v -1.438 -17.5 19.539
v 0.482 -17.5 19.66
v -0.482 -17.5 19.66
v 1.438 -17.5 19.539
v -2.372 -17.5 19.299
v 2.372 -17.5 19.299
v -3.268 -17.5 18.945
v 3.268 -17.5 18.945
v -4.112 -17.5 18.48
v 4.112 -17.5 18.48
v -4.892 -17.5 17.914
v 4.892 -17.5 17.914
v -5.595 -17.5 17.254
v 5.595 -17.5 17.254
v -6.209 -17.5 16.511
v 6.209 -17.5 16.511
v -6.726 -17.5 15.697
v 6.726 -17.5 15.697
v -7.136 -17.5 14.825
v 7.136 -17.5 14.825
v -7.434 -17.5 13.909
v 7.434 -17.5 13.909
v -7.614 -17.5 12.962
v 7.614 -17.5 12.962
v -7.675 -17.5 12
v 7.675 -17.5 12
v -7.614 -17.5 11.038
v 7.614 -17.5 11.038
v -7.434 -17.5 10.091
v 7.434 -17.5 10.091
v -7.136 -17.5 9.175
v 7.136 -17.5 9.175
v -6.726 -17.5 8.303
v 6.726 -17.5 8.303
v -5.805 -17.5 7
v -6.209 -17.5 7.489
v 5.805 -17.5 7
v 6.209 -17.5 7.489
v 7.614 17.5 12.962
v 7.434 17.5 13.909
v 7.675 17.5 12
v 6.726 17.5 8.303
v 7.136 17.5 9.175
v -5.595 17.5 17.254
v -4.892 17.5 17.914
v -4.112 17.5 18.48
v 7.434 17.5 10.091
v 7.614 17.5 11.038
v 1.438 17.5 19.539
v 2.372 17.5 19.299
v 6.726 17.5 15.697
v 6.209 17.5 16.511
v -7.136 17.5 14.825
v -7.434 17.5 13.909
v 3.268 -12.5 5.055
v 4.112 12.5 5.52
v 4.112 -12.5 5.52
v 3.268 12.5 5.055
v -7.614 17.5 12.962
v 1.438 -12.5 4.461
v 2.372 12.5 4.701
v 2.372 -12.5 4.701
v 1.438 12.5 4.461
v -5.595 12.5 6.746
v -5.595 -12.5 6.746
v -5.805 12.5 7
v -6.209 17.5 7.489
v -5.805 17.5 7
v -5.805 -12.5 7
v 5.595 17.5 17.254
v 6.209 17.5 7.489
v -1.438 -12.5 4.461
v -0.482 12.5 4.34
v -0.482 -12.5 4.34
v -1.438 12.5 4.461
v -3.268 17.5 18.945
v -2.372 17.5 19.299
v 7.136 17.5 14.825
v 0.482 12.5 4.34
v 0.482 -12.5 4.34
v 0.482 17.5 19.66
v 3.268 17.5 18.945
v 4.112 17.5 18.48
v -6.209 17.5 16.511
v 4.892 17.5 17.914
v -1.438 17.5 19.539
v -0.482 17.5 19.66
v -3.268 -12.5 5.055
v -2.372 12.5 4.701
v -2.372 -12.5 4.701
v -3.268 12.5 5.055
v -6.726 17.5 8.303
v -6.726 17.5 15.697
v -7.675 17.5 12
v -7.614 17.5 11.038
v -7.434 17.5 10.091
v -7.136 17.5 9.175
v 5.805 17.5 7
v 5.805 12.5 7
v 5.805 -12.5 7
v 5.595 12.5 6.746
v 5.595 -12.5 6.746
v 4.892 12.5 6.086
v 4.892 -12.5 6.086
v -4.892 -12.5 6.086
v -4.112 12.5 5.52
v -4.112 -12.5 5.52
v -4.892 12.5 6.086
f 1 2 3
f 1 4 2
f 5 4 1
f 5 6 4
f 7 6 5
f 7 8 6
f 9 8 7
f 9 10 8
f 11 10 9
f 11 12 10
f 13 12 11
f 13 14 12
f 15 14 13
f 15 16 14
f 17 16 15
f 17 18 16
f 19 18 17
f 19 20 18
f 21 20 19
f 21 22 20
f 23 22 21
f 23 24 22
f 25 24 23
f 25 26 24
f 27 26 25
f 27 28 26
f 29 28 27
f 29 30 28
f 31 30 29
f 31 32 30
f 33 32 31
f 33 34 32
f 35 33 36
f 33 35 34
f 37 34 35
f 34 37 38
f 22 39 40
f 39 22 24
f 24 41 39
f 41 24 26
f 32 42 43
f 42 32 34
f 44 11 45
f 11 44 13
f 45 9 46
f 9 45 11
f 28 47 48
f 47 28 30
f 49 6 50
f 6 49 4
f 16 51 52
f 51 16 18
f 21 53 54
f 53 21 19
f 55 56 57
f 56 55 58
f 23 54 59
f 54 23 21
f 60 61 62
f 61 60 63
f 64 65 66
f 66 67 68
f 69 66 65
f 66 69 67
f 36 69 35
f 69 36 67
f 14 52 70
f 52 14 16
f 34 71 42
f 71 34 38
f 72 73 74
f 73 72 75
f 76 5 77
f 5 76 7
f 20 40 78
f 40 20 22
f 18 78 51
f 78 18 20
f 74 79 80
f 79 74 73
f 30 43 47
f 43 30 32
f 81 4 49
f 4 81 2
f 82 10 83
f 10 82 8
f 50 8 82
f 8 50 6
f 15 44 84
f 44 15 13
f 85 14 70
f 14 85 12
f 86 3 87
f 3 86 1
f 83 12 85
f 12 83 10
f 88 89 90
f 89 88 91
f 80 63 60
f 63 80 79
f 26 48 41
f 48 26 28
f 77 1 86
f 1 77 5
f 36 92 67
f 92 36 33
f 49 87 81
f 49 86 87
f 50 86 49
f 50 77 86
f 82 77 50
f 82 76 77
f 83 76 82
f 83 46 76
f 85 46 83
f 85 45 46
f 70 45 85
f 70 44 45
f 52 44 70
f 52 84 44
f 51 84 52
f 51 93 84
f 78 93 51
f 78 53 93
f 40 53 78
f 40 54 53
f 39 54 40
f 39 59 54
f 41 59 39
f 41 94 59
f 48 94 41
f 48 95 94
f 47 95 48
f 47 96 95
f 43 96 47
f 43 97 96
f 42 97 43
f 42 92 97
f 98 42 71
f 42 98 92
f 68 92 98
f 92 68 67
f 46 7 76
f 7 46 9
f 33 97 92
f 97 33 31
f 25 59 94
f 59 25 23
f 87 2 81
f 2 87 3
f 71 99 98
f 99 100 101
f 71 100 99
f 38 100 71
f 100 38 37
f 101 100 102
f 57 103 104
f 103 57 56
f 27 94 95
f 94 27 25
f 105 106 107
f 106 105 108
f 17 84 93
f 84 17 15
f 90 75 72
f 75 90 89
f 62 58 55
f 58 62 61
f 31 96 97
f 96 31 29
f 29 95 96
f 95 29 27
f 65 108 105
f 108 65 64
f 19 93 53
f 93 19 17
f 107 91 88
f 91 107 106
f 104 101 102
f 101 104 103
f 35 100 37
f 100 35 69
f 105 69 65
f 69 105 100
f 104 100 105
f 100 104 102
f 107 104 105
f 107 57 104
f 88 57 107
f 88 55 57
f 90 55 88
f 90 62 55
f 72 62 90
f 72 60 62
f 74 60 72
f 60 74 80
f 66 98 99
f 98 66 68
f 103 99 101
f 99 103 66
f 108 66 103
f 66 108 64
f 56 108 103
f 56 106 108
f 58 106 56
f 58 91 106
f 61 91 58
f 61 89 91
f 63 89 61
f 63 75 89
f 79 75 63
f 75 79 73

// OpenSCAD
// file: polyholes.scad
//
// Mendel90
//
// GNU GPL v2
// nop.head@gmail.com
// hydraraptor.blogspot.com
//
// See http://hydraraptor.blogspot.com/2011/02/polyholes.html
//
function sides(r) = max(round(4 *r),3);
function correctedRadius(r,n) = 0.1 + r / cos(180 / n);
function correctedDiameter(d) = 0.2 + d / cos(180 / sides(d / 2));

module polyCircle(r, center = false) {
    n = sides(r);
    circle(r = correctedRadius(r,n), $fn = n, center = center);
}

module poly_circle(r, center = false) {
    polyCircle(r, center);
}

module polyCylinder(r, h, center = false) {
    n = sides(r);
    cylinder(h = h, r = correctedRadius(r,n), $fn = n, center = center);
}

module poly_cylinder(r, h, center = false) {
    polyCylinder(r,h,center);
}

module polydCylinder(r, center = false) {
    n = sides(r);
    r = correctedRadius(r,n);
    cylinder(h = h, r = r, $fn = n, center = center);
    translate([0, -r, 0])
        cube([r, 2 * r, h]);
}

module poly_d_cylinder(r, center = false) {
    polydCylinder(r,center);
}
// main file
// PRUSA iteration3
// Bearing holders
// GNU GPL v3
// Josef Průša <iam@josefprusa.cz> and contributors
// http://www.reprap.org/wiki/Prusa_Mendel
// http://prusamendel.org

use <polyholes.scad>

bearing_diameter = 14.95;

module horizontal_bearing_base(bearings=1){
    translate([0,0,6]) cube([24,8+bearings*25,12],center=true);
}

module horizontal_bearing_holes(bearings=1){
    cutter_lenght = 10+bearings*25;
    one_holder_lenght = 8+25;
    holder_lenght = 8+bearings*25;

    // Main bearing cut
    difference(){
        translate([0,0,12]) rotate([90,0,0]) translate([0,0,-cutter_lenght/2]) cylinder(h=cutter_lenght,r=(bearing_diameter/2)+0.2,$fn=50);

        // Bearing retainers
        translate([0,1-holder_lenght/2,3]) cube([24,6,8],center=true);
        translate([0,-1+holder_lenght/2,3]) cube([24,6,8],center=true);
    }

    // Ziptie cutouts
    ziptie_cut_ofset = 0;
    for (i=[0:bearings-1]){
        // For easier positioning I move them by half of one
        // bearing holder then add each bearign lenght and then center again
        translate([0,-holder_lenght/2,0]) translate([0,one_holder_lenght/2+i*25,0]) difference(){
            union(){
                translate([0,2-8.5,12]) rotate([90,0,0]) translate([0,0,0]) cylinder(h=4,r=11.5,$fn=50);
                translate([0,2+8.5,12]) rotate([90,0,0]) translate([0,0,0]) cylinder(h=4,r=11.5,$fn=50);
            }
            translate([0,12,12]) rotate([90,0,0]) translate([0,0,0]) cylinder(h = 24,r=9,$fn=50);
        }
    }
}

module horizontal_bearing_holes_nozip(bearings=1){
    cutter_lenght = 10+bearings*25;
    one_holder_lenght = 8+25;
    holder_lenght = 8+bearings*25;

    // Main bearing cut
    difference(){
        translate([0,0,12]) rotate([90,0,0]) translate([0,0,-cutter_lenght/2]) cylinder(h = cutter_lenght,r=(bearing_diameter/2)+0.2,$fn=50);

        // Bearing retainers
        translate([0,1-holder_lenght/2,3]) cube([24,6,8],center=true);
        translate([0,-1+holder_lenght/2,3]) cube([24,6,8],center=true);
    }

}

thinwall = 3;
bearing_size = bearing_diameter+2*thinwall;

module vertical_bearing_base(){
    translate([-2-bearing_size/4,0,29]) cube([4+bearing_size/2,bearing_size,58],center=true);
    cylinder(h=58,r=bearing_size/2,$fn = 90);
}

module vertical_bearing_holes(){
    translate([0,0,-1]) poly_cylinder(h = 62,r=(bearing_diameter/2));
    translate([0,0,-0.1]) cylinder(r1=(bearing_diameter/2)+0.7,r2=(bearing_diameter/2),h=0.5);
    rotate([0,0,-40]) translate([bearing_diameter/2-2.9,-0.5,0.5]) cube([thinwall*2,1,62]);
}

//difference(){
//vertical_bearing_base();
//vertical_bearing_holes();
//}
//horizontal_bearing_test();
//horizontal_bearing_base(1);
//horizontal_bearing_holes(1);
horizontal_bearing_holes_nozip(1);
